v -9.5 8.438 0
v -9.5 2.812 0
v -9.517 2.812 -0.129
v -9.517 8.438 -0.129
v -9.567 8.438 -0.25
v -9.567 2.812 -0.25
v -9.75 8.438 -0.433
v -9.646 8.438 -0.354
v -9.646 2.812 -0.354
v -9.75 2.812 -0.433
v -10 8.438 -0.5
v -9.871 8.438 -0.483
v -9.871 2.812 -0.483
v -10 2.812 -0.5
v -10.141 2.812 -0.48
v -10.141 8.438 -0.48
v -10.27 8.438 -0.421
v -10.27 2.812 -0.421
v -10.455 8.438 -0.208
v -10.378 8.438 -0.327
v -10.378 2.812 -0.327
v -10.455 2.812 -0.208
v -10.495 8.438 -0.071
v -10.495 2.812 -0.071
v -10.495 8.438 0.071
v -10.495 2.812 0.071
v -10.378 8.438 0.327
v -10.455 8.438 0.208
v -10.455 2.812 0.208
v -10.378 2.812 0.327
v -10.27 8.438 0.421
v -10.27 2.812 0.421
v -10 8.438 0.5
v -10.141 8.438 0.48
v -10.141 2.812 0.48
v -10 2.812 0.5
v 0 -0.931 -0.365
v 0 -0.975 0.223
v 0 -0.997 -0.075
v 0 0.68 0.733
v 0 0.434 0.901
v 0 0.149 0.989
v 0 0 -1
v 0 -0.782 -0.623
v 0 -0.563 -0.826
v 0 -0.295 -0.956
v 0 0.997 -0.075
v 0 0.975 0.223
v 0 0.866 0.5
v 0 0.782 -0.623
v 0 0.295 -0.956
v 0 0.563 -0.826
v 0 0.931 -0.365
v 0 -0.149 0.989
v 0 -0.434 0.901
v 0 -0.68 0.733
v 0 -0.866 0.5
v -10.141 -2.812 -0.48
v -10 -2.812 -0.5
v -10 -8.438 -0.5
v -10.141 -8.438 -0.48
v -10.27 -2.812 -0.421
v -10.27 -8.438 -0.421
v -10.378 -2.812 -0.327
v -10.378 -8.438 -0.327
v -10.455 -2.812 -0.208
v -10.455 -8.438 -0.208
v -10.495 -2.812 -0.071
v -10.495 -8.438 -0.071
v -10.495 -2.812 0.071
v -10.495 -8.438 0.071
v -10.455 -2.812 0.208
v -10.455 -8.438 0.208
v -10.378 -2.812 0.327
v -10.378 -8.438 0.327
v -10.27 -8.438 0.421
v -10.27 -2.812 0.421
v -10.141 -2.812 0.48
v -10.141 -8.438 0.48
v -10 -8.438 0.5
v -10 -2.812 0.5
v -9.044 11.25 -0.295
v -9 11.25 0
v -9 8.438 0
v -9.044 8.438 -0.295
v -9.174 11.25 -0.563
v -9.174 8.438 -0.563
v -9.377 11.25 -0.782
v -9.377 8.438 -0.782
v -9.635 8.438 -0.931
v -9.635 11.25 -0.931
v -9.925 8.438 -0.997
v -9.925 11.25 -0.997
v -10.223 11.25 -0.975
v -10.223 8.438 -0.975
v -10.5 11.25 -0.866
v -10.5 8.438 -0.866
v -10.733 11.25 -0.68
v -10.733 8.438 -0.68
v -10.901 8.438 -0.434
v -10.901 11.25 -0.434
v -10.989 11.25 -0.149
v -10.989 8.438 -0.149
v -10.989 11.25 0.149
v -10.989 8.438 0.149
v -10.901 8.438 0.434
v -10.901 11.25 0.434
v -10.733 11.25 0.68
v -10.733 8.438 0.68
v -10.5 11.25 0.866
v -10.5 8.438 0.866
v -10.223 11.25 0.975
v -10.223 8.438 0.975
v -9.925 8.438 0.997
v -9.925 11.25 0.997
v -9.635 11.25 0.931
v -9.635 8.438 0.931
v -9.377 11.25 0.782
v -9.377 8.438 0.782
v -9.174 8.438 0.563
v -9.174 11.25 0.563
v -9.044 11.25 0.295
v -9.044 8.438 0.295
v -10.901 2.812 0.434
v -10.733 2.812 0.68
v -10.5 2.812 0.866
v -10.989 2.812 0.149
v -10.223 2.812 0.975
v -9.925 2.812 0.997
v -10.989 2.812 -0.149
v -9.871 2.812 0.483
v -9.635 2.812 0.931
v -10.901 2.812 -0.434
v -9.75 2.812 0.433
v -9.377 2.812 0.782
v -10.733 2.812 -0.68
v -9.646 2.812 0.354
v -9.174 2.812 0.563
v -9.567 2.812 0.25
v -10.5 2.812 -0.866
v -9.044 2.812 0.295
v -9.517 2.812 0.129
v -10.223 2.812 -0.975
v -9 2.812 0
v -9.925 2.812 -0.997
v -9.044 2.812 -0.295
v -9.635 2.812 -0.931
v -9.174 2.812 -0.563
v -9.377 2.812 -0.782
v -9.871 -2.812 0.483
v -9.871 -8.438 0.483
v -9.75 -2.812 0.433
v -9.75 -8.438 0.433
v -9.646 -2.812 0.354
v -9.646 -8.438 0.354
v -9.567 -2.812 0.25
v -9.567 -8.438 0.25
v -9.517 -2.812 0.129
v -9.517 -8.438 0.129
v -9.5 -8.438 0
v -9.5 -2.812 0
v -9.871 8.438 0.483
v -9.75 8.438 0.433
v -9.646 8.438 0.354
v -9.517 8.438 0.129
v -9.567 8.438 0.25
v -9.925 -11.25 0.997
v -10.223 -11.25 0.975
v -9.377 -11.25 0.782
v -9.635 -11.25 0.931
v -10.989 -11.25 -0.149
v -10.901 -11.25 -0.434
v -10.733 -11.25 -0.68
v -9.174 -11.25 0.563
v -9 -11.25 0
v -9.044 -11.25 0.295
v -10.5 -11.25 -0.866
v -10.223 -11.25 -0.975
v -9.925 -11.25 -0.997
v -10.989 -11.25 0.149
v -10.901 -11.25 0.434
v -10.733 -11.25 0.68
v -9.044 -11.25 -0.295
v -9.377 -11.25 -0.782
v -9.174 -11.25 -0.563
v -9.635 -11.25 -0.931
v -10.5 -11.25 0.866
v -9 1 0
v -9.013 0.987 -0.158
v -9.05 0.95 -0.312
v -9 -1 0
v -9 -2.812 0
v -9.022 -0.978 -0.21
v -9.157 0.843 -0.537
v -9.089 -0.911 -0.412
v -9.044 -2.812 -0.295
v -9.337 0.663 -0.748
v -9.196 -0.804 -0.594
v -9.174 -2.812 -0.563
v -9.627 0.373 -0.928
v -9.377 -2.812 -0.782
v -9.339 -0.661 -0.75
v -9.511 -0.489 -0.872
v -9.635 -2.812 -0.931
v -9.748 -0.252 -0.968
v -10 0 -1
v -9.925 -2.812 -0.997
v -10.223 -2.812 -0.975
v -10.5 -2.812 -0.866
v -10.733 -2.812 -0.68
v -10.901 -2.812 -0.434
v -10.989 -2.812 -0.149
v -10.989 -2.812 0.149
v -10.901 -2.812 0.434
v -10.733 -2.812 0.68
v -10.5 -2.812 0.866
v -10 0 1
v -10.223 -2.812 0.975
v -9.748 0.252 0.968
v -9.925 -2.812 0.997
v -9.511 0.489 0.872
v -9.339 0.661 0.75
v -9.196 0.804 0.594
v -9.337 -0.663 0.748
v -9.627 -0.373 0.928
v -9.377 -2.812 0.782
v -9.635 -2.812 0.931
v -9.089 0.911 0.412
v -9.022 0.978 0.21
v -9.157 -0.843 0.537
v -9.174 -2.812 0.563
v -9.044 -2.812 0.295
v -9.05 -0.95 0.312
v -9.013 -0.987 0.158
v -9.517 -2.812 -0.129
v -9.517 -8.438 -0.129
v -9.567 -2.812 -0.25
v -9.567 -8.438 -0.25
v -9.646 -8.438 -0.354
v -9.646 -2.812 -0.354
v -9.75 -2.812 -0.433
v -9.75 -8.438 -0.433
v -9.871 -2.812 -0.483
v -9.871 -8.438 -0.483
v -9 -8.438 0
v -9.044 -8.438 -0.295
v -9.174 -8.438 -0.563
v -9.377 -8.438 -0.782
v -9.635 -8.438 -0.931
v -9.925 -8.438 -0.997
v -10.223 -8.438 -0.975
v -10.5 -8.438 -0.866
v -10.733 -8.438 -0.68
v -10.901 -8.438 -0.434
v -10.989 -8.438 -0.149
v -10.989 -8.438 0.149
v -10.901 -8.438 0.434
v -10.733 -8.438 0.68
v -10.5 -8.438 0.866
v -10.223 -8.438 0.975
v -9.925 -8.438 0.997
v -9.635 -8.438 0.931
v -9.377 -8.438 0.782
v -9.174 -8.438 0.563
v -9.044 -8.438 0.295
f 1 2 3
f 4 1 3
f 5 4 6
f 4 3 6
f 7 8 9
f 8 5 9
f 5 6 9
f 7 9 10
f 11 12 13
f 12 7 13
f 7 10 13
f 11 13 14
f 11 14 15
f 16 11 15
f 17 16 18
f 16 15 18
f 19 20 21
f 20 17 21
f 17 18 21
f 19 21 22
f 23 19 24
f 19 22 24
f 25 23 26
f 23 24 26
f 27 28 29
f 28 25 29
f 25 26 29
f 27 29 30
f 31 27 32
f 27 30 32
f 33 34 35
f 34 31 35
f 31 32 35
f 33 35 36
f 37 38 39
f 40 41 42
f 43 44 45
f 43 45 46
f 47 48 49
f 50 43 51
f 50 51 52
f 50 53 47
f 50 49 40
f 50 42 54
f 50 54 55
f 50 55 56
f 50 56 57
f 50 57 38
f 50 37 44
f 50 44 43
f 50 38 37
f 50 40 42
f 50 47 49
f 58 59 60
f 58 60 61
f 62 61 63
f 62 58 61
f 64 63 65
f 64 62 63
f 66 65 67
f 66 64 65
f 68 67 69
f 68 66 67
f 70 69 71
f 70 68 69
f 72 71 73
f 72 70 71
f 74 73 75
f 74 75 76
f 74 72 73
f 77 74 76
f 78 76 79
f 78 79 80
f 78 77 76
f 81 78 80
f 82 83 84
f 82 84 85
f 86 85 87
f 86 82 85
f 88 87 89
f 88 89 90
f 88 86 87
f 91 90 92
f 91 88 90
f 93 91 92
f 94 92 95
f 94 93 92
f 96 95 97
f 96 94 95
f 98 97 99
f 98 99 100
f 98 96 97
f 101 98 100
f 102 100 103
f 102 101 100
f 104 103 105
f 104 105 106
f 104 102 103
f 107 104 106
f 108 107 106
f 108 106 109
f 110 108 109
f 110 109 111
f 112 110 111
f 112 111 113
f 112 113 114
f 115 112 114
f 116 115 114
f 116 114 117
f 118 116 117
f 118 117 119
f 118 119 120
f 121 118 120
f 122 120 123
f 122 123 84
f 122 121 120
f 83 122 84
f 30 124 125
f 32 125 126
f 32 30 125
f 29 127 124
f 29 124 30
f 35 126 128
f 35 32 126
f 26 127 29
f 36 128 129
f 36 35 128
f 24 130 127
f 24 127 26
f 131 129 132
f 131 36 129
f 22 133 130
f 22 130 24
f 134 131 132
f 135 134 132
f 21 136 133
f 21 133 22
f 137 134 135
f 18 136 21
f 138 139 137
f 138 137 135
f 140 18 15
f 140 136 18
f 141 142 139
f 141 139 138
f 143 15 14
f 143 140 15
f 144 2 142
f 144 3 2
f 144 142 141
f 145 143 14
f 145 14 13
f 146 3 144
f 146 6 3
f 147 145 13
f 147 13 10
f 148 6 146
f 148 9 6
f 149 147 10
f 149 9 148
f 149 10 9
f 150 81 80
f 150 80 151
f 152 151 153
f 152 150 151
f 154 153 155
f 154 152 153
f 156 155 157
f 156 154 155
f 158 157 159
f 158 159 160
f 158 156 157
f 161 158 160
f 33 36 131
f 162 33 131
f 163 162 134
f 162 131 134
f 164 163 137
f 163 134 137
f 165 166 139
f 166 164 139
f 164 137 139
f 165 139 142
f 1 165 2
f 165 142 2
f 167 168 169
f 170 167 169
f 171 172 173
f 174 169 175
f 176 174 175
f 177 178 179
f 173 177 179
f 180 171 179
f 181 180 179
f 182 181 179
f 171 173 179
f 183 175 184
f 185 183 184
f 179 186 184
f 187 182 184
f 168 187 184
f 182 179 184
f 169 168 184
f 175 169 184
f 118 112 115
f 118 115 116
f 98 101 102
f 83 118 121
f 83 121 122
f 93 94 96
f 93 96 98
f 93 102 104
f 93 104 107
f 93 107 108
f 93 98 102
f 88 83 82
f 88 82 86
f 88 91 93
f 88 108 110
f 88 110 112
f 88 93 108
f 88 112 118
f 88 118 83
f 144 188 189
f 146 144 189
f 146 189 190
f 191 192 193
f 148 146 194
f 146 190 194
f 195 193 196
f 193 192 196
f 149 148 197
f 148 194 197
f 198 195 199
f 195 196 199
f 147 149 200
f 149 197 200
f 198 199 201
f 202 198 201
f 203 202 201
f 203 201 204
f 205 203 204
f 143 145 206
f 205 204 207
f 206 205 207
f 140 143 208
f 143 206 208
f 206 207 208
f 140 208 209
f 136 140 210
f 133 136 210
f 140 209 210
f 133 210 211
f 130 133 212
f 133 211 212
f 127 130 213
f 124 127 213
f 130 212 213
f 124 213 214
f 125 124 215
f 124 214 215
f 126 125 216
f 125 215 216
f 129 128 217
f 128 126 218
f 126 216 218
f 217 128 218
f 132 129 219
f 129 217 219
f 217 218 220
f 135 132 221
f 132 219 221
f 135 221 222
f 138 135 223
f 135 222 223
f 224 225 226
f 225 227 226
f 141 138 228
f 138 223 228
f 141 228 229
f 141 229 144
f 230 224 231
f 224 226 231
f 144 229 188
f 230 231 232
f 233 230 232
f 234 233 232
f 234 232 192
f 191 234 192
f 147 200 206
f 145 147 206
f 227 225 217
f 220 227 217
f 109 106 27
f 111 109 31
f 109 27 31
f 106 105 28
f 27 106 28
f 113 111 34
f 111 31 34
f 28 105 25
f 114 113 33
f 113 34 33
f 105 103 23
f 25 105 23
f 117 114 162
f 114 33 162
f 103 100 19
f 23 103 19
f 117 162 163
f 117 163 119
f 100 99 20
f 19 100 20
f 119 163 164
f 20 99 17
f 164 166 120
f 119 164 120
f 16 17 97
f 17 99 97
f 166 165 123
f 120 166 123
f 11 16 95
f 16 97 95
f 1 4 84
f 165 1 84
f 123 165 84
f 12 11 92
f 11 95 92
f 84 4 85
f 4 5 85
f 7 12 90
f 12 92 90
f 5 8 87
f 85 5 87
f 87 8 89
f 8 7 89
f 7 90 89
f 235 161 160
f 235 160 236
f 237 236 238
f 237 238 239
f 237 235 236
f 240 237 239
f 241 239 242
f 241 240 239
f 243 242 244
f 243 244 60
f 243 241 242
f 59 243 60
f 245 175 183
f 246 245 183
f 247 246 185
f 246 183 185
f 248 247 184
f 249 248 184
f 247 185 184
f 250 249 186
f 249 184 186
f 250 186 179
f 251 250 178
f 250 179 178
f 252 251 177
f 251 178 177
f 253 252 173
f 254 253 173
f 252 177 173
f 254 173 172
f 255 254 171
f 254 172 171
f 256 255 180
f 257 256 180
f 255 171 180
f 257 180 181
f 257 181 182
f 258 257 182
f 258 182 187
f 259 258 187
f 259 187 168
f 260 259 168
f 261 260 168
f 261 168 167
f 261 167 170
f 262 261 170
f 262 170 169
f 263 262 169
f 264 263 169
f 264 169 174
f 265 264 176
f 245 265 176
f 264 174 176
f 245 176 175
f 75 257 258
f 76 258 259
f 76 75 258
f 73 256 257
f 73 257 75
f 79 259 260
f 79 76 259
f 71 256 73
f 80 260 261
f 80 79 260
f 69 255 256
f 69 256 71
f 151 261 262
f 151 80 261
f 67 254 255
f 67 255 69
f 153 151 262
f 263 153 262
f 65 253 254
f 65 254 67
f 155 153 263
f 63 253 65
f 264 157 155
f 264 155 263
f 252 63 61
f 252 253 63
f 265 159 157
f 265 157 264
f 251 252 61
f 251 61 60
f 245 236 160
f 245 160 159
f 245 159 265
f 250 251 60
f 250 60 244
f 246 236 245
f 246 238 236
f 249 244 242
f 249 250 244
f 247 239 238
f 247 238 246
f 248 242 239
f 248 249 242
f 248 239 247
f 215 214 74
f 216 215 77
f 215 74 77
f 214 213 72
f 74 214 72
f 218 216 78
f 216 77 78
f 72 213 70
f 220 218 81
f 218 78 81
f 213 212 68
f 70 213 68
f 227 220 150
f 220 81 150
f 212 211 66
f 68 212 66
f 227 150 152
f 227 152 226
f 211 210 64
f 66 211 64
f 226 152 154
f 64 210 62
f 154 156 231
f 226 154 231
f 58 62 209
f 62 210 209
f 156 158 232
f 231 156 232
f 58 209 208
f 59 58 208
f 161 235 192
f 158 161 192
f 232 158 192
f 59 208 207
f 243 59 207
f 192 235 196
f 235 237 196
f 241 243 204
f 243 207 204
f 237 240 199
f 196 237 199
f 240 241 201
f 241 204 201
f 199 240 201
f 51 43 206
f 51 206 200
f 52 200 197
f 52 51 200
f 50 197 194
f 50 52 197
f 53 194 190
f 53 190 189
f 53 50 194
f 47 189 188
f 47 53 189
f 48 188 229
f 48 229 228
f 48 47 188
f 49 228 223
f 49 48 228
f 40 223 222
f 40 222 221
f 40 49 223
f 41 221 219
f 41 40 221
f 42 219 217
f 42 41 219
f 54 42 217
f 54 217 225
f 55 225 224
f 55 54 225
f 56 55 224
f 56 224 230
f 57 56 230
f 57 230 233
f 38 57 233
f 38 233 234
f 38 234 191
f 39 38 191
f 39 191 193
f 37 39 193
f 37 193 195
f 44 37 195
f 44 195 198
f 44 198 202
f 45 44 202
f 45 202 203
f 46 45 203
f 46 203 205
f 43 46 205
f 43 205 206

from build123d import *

# Parameters (mm, degrees)
SKETCH3_R                = 1
BOSS_EXTRUDE1_DEPTH      = 10
BOSS_EXTRUDE2_DEPTH      = 11.25
BOSS_EXTRUDE2_DEPTH_BACK = 11.25
SKETCH4_R                = 0.5
BOSS_EXTRUDE3_DEPTH      = 2.8125
BOSS_EXTRUDE3_DEPTH_BACK = 2.8125
SKETCH6_R                = 1
SKETCH7_R                = 1
BOSS_EXTRUDE4_DEPTH      = 2.8125


with BuildPart() as part:
    # Sketch3 → Boss-Extrude1 (new body)
    with BuildSketch(Plane(origin=(0, 0, 0), x_dir=(0, 0, -1), z_dir=(1, 0, 0))):
        Circle(SKETCH3_R)
    extrude(amount=-BOSS_EXTRUDE1_DEPTH)

    # Sketch4 → Boss-Extrude2 (add, two sides: drawn at the far end of the back side and taken through both)
    with BuildSketch(Plane(origin=(0, 0, 0), x_dir=(1, 0, 0), z_dir=(0, 1, 0)).offset(-BOSS_EXTRUDE2_DEPTH_BACK)):
        with Locations((-10, 0)):
            Circle(SKETCH4_R)
    extrude(amount=BOSS_EXTRUDE2_DEPTH + BOSS_EXTRUDE2_DEPTH_BACK)

    # Sketch6 → Boss-Extrude3 (add, two sides: drawn at the far end of the back side and taken through both)
    with BuildSketch(Plane(origin=(0, 0, 0), x_dir=(1, 0, 0), z_dir=(0, 1, 0)).offset(-BOSS_EXTRUDE3_DEPTH_BACK)):
        with Locations((-10, 0)):
            Circle(SKETCH6_R)
    extrude(amount=BOSS_EXTRUDE3_DEPTH + BOSS_EXTRUDE3_DEPTH_BACK)

    # Sketch7 → Boss-Extrude4 (add)
    with BuildSketch(Plane(origin=(0, 11.25, 0), x_dir=(1, 0, 0), z_dir=(0, 1, 0))):
        with Locations((-10, 0)):
            Circle(SKETCH7_R)
    boss_extrude4 = extrude(amount=-BOSS_EXTRUDE4_DEPTH)

    # Mirror1: Boss-Extrude4 across plane
    add(boss_extrude4.mirror(Plane.ZX))


solid = part.part
